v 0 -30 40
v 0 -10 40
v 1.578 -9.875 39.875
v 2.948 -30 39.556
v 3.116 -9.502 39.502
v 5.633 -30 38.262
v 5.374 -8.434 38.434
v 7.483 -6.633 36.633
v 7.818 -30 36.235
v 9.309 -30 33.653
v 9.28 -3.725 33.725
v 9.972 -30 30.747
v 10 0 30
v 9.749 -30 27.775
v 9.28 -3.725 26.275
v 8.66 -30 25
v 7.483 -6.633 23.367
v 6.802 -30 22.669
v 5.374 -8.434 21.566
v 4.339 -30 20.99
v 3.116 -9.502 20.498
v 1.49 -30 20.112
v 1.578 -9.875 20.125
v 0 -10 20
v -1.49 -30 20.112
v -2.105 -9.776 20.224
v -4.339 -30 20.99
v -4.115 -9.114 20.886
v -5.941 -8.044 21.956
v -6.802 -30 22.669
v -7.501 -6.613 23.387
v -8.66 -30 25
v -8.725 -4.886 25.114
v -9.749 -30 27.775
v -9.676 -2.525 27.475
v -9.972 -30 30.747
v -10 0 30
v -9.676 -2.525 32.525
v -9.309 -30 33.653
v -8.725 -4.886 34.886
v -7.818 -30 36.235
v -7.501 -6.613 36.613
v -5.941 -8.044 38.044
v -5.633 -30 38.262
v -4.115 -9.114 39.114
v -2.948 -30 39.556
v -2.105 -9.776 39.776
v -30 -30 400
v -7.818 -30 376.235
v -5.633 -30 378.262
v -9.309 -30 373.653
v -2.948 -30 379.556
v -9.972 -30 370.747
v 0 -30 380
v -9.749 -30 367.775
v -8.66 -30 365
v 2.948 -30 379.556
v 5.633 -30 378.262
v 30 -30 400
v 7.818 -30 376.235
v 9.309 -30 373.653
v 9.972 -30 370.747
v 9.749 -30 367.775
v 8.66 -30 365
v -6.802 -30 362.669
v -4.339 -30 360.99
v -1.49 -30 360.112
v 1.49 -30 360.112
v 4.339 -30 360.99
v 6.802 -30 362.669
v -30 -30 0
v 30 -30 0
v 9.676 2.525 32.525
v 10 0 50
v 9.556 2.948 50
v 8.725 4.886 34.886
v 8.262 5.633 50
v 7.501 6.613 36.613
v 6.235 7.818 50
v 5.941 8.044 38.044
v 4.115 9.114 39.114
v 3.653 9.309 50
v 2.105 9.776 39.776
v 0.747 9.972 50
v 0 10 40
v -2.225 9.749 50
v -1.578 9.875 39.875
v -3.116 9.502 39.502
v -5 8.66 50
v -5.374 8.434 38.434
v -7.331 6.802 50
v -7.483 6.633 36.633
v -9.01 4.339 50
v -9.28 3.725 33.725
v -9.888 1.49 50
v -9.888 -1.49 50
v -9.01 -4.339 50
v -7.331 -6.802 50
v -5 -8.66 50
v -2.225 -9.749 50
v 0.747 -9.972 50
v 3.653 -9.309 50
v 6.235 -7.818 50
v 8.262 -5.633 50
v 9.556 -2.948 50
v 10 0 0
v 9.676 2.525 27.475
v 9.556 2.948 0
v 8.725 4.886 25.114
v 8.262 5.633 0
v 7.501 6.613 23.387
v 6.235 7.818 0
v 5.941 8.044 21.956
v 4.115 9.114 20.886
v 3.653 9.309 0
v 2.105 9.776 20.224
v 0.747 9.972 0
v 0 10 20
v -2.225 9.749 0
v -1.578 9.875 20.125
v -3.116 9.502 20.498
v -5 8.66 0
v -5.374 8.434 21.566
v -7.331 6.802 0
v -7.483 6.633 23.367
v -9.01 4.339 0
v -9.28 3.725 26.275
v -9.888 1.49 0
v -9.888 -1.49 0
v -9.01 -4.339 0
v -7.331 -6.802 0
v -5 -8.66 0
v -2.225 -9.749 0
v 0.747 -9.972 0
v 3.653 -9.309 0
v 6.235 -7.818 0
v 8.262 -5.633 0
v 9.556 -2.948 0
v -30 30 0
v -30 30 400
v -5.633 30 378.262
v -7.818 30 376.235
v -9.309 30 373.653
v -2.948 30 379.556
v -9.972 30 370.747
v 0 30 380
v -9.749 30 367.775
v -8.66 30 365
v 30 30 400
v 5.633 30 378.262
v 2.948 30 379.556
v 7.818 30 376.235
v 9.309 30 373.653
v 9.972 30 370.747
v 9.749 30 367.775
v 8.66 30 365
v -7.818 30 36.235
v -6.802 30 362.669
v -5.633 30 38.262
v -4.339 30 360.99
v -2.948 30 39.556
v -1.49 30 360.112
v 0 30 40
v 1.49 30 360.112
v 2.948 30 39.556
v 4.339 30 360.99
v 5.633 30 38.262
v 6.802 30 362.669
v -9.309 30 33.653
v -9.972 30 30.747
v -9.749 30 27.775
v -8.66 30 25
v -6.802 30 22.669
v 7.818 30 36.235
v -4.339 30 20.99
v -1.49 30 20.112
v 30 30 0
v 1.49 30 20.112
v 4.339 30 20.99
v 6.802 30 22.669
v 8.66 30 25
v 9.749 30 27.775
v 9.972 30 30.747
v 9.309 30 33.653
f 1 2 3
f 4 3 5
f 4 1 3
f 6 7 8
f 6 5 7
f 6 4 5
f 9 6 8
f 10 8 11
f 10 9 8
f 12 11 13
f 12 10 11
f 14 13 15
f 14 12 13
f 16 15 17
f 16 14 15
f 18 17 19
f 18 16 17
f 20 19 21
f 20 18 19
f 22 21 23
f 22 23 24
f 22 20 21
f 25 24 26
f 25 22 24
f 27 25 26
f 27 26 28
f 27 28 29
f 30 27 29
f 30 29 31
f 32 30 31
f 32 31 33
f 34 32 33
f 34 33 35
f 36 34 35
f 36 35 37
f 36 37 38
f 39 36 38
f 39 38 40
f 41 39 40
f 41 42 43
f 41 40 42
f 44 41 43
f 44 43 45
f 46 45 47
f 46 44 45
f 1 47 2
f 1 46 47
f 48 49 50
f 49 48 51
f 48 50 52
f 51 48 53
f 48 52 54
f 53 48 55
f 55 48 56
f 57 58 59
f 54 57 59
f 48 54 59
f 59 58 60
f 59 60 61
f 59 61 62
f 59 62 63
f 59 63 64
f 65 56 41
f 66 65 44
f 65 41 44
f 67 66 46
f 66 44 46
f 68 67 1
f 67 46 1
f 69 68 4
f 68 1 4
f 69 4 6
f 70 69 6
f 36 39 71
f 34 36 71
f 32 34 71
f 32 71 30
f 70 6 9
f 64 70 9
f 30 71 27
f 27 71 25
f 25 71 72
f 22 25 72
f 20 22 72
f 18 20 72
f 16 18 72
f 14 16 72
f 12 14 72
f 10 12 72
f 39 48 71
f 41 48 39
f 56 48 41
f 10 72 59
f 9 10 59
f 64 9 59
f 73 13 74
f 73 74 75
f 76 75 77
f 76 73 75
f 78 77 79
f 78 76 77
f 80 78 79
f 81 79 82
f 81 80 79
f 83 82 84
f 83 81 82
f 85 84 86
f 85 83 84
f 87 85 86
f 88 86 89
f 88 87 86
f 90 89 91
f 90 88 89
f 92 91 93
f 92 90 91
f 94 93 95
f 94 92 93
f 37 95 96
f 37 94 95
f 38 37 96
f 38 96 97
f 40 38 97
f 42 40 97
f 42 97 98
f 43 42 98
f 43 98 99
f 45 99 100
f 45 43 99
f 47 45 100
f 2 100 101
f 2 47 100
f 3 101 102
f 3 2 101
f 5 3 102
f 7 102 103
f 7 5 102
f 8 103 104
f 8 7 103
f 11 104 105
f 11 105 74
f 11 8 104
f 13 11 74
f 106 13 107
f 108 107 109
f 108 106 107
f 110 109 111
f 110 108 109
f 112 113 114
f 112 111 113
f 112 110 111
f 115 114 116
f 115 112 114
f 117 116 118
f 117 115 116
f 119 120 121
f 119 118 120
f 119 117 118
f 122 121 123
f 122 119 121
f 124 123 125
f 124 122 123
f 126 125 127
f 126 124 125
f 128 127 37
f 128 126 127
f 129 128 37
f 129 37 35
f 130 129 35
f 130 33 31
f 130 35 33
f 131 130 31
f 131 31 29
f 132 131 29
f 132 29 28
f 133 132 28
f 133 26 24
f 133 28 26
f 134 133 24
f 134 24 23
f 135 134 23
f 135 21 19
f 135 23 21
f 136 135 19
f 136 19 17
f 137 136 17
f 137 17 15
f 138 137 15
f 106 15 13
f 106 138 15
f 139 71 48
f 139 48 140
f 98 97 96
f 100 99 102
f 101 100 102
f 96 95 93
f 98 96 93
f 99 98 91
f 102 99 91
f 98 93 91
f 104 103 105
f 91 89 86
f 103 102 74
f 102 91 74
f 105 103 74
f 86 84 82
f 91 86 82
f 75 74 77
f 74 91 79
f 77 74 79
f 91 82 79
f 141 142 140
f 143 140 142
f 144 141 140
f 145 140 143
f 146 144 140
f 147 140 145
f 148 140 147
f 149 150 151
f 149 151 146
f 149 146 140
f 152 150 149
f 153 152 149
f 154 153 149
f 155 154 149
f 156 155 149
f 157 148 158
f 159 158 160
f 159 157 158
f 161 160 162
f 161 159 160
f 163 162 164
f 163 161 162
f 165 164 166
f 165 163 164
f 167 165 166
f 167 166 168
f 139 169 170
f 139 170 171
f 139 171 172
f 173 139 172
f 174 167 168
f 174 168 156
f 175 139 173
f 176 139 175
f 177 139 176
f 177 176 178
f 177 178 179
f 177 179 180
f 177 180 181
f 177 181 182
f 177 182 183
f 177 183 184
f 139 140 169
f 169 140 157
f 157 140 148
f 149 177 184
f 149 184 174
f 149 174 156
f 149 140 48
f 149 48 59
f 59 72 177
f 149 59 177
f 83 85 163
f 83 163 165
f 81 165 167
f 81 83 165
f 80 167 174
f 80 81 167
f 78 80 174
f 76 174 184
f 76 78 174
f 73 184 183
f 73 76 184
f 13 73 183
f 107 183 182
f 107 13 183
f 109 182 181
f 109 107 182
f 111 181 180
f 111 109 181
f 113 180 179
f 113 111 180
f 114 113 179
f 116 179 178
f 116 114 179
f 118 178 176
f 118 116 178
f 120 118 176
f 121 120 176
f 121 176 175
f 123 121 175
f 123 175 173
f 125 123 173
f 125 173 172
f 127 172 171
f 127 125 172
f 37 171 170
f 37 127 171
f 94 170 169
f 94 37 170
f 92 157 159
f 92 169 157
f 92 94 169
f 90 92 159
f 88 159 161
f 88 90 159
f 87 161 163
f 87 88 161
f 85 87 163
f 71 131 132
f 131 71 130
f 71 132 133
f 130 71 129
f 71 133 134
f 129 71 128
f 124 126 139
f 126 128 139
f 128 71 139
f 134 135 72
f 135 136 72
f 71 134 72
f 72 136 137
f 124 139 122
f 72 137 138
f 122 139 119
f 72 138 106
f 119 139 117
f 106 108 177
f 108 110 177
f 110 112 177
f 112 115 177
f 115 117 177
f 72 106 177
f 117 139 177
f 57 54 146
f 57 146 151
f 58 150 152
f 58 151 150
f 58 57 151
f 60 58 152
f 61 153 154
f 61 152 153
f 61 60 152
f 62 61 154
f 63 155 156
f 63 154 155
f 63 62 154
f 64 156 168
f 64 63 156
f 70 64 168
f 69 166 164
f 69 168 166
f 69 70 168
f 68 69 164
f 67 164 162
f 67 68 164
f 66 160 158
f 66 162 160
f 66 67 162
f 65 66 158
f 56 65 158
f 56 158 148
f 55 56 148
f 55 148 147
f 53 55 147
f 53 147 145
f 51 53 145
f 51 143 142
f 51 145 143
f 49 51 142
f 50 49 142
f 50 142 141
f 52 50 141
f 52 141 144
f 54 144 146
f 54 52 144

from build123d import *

# Parameters (mm, degrees)
SKETCH1_W               = 60
SKETCH1_H               = 60
BOSS_EXTRUDE1_DEPTH     = 400
SKETCH2_R               = 10
CUT_EXTRUDE1_DEPTH      = 50
CUT_EXTRUDE2_DEPTH      = 60
CUT_EXTRUDE2_DEPTH_BACK = 60
SKETCH3_R               = 10
CUT_EXTRUDE3_DEPTH      = 60
CUT_EXTRUDE3_DEPTH_BACK = 60
SKETCH4_R               = 10


with BuildPart() as part:
    # Sketch1 → Boss-Extrude1 (new body)
    with BuildSketch(Plane.XY):
        Rectangle(SKETCH1_W, SKETCH1_H)
    extrude(amount=BOSS_EXTRUDE1_DEPTH)

    # Sketch2 → Cut-Extrude1 (cut)
    with BuildSketch(Plane.XY):
        Circle(SKETCH2_R)
    extrude(amount=CUT_EXTRUDE1_DEPTH, mode=Mode.SUBTRACT)

    # Sketch3 → Cut-Extrude2 (cut, two sides: drawn at the far end of the back side and taken through both)
    with BuildSketch(Plane(origin=(0, 0, 0), x_dir=(1, 0, 0), z_dir=(0, 1, 0)).offset(-CUT_EXTRUDE2_DEPTH_BACK)):
        with Locations((0, -30)):
            Circle(SKETCH3_R)
    extrude(amount=CUT_EXTRUDE2_DEPTH + CUT_EXTRUDE2_DEPTH_BACK, mode=Mode.SUBTRACT)

    # Sketch4 → Cut-Extrude3 (cut, two sides: drawn at the far end of the back side and taken through both)
    with BuildSketch(Plane(origin=(0, 0, 0), x_dir=(1, 0, 0), z_dir=(0, 1, 0)).offset(-CUT_EXTRUDE3_DEPTH_BACK)):
        with Locations((0, -370)):
            Circle(SKETCH4_R)
    extrude(amount=CUT_EXTRUDE3_DEPTH + CUT_EXTRUDE3_DEPTH_BACK, mode=Mode.SUBTRACT)


solid = part.part
